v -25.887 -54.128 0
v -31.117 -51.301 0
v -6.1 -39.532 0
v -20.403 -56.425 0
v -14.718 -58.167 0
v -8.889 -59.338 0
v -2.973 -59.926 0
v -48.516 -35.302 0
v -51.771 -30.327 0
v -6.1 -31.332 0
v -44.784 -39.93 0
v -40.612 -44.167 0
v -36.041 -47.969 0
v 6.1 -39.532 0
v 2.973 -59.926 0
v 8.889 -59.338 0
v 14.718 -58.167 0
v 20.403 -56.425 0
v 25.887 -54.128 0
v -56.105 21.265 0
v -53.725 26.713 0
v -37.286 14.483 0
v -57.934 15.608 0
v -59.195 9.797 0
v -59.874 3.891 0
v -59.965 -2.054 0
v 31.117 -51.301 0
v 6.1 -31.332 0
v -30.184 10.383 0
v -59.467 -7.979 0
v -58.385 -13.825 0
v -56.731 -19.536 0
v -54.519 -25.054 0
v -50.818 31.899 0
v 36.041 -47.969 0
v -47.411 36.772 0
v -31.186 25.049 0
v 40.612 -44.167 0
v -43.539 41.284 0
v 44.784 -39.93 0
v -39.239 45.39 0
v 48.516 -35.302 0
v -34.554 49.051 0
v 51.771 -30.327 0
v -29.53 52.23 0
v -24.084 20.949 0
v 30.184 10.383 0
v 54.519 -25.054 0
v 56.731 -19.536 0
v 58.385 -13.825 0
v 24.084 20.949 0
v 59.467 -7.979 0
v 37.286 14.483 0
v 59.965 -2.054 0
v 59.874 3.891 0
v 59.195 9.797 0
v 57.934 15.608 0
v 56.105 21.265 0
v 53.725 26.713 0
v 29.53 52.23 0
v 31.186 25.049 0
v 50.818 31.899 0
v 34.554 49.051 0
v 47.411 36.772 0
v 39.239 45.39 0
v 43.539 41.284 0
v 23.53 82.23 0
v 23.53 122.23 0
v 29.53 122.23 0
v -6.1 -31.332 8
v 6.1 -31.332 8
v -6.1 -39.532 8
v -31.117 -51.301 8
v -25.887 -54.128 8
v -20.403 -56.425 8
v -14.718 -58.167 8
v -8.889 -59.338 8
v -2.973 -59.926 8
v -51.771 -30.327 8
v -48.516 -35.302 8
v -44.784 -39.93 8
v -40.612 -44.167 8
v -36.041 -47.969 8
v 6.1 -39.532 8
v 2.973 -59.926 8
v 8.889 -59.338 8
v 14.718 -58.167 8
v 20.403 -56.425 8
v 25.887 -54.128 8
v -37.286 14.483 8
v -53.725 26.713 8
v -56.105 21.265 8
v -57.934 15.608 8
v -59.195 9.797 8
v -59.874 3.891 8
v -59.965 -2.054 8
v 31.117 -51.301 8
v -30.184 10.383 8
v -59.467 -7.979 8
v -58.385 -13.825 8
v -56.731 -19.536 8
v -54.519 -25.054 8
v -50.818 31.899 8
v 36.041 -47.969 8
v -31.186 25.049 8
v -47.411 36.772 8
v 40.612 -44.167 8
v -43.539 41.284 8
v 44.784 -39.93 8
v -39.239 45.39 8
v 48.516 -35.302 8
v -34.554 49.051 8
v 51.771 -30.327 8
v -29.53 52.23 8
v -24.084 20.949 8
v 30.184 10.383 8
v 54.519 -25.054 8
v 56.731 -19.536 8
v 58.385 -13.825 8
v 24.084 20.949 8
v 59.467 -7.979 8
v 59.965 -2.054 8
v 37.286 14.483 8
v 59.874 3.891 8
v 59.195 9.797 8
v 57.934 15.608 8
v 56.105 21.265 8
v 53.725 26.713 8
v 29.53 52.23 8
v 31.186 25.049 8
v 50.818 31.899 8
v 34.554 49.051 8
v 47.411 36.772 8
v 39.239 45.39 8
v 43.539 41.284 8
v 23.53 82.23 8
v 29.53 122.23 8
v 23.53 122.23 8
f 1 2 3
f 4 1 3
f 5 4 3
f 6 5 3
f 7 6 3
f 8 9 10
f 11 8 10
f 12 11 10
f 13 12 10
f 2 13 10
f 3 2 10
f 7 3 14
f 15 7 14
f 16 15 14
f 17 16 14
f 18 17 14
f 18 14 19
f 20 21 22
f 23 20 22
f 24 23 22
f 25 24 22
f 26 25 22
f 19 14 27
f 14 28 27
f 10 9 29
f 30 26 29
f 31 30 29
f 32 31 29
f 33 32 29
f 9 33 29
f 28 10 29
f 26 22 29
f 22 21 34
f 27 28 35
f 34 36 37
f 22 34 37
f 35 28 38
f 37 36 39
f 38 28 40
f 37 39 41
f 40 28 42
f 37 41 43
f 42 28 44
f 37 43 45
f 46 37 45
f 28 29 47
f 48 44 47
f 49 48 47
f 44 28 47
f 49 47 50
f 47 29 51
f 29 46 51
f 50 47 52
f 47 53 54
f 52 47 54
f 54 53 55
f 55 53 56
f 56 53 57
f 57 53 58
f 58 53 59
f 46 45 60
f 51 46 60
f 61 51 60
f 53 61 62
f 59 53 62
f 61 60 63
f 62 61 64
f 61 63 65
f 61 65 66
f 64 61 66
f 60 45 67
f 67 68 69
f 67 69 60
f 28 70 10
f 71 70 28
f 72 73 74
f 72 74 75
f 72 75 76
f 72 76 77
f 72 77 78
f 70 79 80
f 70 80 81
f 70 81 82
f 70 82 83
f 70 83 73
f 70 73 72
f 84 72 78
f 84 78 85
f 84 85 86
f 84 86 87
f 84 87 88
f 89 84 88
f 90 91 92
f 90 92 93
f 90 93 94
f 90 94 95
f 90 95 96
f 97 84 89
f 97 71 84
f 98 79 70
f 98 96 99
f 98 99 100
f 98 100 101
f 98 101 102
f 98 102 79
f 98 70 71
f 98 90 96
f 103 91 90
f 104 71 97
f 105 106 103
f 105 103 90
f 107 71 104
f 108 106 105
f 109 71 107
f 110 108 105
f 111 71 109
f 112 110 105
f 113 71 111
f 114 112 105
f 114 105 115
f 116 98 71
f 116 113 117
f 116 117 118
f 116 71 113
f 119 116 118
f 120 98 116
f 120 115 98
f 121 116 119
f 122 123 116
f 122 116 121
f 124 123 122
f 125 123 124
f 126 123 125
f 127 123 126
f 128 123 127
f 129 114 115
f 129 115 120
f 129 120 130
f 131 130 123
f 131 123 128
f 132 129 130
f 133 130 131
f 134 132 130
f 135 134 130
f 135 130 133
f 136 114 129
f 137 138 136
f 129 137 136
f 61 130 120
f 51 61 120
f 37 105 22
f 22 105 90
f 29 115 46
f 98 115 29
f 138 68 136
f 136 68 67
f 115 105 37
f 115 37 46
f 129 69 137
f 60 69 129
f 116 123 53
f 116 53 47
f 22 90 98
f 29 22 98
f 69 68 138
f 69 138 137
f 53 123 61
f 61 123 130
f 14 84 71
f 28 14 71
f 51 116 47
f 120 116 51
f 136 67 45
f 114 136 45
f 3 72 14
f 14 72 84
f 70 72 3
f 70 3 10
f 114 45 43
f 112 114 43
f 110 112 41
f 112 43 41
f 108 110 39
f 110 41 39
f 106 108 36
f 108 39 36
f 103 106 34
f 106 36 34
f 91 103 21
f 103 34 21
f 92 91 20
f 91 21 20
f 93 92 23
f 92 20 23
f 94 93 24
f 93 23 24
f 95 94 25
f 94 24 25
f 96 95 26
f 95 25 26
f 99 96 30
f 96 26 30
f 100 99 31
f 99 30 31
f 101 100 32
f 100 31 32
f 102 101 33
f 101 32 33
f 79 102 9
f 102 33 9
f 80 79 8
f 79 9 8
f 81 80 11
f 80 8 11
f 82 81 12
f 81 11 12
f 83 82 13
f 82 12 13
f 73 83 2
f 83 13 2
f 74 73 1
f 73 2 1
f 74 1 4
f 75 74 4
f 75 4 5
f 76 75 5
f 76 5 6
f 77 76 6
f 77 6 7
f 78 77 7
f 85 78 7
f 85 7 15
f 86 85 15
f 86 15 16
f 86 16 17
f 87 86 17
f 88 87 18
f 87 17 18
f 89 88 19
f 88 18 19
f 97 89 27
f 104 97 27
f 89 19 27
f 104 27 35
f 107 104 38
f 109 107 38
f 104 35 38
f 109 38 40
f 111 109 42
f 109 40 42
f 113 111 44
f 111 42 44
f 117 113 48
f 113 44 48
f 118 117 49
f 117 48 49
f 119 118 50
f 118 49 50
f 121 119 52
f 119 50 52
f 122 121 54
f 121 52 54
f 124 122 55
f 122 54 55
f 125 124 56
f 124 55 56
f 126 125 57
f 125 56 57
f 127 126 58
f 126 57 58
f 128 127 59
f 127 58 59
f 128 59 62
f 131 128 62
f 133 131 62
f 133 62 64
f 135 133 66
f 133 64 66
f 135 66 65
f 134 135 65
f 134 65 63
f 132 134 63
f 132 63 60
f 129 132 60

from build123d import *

# Parameters (mm, degrees)
PAD_DEPTH          = 8
SKETCH001_W        = 12.2
SKETCH001_H        = 8.2
POCKET_DEPTH       = 8
POLARPATTERN_COUNT = 3


with BuildPart() as part:
    # Sketch → Pad (new body)
    with BuildSketch(Plane.XY):
        with BuildLine():
            ThreePointArc((-29.53026, 52.229912), (0, -60), (29.53026, 52.229912))
            Line((29.53026, 122.229912), (29.53026, 52.229912))
            Line((23.53026, 122.229912), (29.53026, 122.229912))
            Line((23.53026, 122.229912), (23.53026, 82.229912))
            Line((23.53026, 82.229912), (-29.53026, 52.229912))
        make_face()
    extrude(amount=PAD_DEPTH)

    # Sketch001 → Pocket (cut)
    with BuildSketch(Plane.XY.offset(8)):
        with Locations((0, -35.432139)):
            Rectangle(SKETCH001_W, SKETCH001_H)
    pocket = extrude(amount=-POCKET_DEPTH, mode=Mode.SUBTRACT)

    # PolarPattern: Pocket ×3 about axis
    polarpattern_axis = Axis((0, 0, 8), (0, 0, 1))
    for i in range(1, POLARPATTERN_COUNT):
        add(pocket.rotate(polarpattern_axis, i * 360 / POLARPATTERN_COUNT), mode=Mode.SUBTRACT)


solid = part.part
